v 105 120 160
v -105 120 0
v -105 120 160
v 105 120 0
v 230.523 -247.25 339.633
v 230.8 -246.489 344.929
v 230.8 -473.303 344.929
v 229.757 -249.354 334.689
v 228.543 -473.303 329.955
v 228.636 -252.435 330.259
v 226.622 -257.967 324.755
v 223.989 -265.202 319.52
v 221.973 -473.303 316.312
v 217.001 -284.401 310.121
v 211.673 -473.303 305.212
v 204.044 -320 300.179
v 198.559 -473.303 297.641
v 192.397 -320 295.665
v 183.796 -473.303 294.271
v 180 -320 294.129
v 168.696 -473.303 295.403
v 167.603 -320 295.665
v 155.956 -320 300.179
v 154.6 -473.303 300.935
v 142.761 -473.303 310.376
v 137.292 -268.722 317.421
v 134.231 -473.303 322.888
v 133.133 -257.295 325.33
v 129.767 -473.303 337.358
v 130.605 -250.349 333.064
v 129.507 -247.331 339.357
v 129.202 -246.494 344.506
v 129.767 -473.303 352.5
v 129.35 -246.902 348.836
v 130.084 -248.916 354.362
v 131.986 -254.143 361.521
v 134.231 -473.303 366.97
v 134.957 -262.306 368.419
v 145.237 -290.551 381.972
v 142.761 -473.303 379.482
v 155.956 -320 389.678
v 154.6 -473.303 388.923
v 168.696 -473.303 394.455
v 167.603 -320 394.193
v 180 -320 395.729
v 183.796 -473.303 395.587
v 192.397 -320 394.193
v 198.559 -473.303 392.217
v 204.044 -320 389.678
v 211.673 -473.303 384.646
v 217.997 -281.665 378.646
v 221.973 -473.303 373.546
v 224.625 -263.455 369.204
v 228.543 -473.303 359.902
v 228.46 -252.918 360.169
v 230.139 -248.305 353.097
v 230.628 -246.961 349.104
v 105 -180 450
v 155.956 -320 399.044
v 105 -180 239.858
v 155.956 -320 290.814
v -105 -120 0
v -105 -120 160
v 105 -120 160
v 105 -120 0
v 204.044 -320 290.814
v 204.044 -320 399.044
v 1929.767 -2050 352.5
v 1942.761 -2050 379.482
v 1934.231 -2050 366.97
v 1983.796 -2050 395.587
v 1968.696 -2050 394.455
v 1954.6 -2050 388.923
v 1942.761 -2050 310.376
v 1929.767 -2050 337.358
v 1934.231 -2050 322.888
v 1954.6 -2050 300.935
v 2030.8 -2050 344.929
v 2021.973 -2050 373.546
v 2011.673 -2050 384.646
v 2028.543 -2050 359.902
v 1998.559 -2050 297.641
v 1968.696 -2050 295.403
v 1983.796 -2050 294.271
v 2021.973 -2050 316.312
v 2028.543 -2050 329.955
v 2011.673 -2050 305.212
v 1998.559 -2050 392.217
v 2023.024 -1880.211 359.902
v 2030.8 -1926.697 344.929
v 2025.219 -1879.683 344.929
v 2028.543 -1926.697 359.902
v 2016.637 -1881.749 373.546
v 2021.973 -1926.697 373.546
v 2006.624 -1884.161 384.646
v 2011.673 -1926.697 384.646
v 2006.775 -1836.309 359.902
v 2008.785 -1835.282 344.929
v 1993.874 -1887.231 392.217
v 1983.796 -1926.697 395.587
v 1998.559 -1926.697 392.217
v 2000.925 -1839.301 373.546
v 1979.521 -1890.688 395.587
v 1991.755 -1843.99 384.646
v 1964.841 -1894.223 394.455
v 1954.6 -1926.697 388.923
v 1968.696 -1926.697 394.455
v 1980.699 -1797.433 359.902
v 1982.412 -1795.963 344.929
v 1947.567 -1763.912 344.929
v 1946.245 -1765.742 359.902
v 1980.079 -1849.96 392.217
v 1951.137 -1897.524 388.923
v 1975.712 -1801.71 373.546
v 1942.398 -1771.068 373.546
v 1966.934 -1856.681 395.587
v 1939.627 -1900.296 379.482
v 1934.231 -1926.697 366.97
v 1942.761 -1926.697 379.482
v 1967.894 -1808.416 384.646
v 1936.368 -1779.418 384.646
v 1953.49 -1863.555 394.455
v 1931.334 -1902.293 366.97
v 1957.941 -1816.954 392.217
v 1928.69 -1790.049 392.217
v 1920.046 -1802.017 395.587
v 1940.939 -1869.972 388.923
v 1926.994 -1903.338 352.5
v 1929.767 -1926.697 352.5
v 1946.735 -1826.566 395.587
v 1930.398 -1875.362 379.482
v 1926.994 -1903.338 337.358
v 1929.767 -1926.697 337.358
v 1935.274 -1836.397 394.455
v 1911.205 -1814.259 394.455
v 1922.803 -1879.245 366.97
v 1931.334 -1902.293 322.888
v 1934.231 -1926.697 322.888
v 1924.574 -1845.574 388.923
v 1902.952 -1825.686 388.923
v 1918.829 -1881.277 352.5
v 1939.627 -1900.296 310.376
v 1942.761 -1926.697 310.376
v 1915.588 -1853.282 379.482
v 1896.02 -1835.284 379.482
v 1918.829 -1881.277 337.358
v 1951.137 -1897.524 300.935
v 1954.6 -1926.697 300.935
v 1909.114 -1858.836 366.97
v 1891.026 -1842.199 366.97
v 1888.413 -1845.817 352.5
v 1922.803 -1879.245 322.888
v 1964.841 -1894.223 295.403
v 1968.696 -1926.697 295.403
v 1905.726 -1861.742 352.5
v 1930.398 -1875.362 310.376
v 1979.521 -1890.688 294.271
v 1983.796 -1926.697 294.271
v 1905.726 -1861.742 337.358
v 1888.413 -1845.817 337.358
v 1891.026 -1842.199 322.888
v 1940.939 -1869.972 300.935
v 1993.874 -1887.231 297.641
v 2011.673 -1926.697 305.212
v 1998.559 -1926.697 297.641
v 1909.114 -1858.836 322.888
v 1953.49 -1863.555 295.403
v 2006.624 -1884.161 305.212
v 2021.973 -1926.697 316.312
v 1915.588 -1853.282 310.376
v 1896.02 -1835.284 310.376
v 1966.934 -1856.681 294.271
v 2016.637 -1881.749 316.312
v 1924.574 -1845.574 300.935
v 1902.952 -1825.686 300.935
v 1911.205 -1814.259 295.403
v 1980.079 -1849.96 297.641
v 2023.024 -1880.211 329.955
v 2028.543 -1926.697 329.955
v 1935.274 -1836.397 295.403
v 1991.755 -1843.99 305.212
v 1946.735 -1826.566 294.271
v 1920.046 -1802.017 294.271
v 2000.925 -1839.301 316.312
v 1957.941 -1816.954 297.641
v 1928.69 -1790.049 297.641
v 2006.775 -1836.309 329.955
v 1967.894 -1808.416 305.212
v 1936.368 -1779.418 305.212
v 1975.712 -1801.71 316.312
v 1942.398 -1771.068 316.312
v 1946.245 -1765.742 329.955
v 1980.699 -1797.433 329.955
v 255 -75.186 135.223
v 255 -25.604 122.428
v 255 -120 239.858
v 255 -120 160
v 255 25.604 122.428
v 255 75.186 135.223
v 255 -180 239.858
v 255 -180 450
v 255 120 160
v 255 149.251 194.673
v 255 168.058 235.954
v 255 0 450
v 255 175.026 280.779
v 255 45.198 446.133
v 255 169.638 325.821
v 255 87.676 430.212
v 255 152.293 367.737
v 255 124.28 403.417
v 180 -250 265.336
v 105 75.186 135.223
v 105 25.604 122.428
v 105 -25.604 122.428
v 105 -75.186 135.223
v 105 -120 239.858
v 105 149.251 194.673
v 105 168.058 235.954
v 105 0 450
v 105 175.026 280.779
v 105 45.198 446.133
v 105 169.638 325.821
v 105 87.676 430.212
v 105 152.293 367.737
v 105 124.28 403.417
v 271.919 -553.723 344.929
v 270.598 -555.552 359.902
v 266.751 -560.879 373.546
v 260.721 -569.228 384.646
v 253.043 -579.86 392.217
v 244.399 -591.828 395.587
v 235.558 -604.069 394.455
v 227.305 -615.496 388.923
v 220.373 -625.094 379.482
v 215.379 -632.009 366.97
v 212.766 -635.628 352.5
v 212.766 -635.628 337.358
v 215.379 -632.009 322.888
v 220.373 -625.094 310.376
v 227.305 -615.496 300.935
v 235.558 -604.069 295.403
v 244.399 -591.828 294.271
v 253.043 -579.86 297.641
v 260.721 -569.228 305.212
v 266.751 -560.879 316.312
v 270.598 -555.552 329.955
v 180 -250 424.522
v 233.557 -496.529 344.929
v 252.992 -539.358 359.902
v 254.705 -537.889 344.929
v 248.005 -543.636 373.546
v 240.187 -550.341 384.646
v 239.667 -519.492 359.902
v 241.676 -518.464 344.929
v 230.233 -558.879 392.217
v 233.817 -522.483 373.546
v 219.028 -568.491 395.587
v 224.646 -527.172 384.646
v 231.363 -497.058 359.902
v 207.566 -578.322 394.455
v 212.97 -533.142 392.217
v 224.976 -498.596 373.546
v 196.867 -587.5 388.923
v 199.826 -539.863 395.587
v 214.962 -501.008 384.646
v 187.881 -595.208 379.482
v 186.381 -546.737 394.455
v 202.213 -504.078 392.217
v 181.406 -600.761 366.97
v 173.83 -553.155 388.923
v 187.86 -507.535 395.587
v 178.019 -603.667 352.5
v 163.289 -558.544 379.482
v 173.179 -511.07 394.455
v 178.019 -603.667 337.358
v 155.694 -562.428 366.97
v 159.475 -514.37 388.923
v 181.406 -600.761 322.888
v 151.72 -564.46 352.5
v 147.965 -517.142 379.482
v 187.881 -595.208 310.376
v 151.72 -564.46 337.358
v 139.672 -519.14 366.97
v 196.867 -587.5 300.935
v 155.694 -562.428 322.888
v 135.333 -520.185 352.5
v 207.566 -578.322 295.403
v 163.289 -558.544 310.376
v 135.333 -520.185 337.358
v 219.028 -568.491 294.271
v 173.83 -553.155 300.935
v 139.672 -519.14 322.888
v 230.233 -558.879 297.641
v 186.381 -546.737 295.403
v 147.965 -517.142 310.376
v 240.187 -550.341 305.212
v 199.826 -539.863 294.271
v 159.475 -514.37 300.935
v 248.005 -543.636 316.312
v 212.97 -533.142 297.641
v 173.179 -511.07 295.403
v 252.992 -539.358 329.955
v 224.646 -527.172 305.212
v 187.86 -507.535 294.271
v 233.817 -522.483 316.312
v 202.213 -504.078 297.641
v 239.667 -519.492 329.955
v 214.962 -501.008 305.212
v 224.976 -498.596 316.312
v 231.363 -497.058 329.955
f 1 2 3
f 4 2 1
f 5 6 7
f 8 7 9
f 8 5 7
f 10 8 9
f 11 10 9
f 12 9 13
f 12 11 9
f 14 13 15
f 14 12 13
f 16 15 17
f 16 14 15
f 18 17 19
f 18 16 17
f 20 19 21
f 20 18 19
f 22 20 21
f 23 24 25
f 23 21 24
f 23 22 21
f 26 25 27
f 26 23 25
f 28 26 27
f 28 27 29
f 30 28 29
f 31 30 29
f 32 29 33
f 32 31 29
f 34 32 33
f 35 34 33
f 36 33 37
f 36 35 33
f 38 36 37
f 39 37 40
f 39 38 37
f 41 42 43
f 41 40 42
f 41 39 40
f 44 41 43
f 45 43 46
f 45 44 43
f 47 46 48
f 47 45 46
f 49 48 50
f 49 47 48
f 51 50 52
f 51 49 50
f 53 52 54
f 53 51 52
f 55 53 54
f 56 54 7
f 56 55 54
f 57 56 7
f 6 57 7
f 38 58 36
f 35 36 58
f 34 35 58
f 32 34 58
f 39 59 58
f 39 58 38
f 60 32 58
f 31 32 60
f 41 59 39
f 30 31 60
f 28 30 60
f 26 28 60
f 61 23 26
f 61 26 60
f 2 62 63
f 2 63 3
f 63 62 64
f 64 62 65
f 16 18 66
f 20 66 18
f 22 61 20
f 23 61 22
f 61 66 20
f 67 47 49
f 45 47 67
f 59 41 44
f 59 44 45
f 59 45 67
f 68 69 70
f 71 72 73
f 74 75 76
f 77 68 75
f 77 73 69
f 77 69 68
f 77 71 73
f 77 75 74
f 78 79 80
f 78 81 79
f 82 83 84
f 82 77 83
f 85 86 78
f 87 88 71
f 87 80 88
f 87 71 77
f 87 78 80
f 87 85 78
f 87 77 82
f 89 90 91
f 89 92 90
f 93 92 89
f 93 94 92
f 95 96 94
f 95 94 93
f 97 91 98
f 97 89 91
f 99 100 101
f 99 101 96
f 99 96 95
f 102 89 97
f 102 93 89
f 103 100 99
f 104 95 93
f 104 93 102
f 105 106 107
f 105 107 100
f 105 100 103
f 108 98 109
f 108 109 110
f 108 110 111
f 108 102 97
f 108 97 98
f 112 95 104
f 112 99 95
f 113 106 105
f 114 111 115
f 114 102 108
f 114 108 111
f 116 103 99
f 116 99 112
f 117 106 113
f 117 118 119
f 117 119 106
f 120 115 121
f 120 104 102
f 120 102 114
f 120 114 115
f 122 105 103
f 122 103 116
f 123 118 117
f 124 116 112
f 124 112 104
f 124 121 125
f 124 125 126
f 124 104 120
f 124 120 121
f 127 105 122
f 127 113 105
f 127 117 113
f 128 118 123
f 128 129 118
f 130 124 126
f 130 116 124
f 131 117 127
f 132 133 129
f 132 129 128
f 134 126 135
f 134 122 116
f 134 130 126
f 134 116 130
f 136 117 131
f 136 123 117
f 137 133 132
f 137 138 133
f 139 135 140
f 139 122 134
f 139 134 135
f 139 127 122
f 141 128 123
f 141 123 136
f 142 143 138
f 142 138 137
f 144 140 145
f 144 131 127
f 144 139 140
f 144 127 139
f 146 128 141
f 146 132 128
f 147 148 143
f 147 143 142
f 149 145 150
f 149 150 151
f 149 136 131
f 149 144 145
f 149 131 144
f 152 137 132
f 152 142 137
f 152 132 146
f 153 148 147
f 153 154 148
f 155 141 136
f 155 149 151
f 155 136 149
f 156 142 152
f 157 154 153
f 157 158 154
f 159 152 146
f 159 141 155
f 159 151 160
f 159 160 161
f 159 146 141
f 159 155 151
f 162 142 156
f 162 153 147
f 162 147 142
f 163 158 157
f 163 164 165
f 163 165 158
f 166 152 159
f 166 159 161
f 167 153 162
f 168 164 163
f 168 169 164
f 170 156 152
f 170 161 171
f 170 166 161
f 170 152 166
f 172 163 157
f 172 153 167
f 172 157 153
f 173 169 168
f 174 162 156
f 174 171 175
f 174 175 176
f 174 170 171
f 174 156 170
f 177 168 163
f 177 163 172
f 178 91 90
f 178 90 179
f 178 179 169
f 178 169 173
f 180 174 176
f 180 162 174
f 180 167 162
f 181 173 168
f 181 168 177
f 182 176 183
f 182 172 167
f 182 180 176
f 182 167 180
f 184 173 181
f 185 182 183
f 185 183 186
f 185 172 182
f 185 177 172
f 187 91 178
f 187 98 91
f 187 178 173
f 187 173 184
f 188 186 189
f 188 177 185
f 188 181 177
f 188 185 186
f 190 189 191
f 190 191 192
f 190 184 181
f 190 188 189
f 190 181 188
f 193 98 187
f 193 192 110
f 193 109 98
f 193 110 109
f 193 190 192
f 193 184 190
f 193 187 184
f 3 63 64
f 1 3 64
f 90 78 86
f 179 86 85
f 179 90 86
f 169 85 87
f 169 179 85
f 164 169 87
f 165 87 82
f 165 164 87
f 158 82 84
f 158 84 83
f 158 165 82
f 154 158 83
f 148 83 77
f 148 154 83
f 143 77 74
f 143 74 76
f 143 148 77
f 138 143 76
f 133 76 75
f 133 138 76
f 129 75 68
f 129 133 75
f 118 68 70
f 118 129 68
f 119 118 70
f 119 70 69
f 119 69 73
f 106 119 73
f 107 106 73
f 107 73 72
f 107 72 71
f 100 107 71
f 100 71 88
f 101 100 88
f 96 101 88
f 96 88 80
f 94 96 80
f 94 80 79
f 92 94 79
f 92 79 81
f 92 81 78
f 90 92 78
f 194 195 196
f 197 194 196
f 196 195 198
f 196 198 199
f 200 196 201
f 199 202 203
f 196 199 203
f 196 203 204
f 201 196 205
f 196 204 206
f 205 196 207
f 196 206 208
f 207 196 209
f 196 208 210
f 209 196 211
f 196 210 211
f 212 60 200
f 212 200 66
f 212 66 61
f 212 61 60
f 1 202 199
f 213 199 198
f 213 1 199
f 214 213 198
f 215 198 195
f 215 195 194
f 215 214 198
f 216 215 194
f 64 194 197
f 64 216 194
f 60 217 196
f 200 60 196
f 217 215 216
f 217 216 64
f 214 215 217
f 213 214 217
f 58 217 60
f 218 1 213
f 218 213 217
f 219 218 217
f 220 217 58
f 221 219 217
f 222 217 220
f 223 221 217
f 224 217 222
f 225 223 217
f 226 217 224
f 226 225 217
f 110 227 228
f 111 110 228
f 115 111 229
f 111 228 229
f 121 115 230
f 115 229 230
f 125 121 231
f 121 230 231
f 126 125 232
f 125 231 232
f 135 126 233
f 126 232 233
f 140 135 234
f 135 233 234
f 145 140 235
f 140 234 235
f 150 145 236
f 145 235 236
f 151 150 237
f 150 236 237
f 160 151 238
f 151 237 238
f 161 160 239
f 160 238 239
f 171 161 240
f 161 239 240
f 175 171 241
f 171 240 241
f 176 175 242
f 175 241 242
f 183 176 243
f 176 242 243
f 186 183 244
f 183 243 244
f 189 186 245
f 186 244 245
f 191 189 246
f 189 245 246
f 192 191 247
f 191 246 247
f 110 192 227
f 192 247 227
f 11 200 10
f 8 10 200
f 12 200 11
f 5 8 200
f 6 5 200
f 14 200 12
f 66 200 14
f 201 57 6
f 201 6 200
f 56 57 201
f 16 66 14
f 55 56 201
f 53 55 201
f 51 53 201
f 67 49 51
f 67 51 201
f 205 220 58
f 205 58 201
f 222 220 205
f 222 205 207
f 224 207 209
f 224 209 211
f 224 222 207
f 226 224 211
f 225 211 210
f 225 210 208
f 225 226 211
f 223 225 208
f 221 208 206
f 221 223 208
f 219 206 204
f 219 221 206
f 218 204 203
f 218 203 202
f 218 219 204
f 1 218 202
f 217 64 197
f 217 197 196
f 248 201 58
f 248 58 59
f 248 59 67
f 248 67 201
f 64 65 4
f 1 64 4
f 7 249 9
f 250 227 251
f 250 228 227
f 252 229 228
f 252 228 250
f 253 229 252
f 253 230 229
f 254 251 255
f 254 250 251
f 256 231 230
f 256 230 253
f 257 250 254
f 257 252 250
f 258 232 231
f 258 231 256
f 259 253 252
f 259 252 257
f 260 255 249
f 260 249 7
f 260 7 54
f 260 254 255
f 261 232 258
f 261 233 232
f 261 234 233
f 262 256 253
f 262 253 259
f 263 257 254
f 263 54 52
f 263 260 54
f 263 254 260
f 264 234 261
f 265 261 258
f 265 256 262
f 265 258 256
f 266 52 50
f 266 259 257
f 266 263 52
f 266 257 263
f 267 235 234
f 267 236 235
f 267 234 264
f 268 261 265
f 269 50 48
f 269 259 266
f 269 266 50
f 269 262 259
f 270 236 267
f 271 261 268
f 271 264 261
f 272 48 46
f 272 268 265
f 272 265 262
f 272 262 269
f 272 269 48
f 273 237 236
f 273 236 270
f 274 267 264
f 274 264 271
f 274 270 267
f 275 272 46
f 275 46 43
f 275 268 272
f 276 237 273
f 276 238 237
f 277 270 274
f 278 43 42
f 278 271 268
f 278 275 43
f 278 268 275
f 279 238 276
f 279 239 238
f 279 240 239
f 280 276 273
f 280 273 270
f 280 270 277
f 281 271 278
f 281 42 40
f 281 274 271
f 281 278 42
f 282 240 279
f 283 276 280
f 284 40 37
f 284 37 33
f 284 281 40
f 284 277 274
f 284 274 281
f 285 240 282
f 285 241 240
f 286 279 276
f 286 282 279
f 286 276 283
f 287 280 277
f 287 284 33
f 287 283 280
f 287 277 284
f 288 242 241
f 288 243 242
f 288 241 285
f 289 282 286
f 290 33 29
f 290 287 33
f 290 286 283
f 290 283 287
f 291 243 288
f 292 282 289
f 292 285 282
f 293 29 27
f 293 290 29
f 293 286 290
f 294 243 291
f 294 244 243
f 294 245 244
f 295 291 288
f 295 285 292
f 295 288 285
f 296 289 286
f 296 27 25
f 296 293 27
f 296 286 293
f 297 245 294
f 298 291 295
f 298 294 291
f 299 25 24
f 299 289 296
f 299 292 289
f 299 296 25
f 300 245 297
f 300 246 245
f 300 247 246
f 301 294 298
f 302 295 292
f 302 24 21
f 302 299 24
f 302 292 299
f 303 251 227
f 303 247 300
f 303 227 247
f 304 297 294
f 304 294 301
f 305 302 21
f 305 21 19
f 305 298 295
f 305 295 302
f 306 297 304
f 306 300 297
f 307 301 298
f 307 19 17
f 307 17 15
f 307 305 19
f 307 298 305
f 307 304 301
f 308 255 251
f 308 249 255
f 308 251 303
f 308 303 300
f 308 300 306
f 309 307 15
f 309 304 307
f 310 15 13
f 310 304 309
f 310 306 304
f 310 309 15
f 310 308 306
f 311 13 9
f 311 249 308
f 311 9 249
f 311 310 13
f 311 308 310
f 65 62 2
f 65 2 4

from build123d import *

# Parameters (mm, degrees)
CROQUIS1_W              = 210
CROQUIS1_H              = 240
SALIENTE_EXTRUIR1_DEPTH = 160
SALIENTE_EXTRUIR2_DEPTH = 150
CROQUIS3_W              = 150
CROQUIS3_H              = 210.142141412
SALIENTE_EXTRUIR3_DEPTH = 60
CROQUIS4_R              = 50.8
SALIENTE_EXTRUIR4_DEPTH = 170
CROQUIS5_W              = 150
CROQUIS5_H              = 210.142141412
SALIENTE_EXTRUIR5_DEPTH = 140
SALIENTE_EXTRUIR5_TAPER = 20
CROQUIS7_R              = 50.8


with BuildPart() as part:
    # Croquis1 → Saliente-Extruir1 (new body)
    with BuildSketch(Plane.XY):
        Rectangle(CROQUIS1_W, CROQUIS1_H)
    extrude(amount=SALIENTE_EXTRUIR1_DEPTH)


with BuildPart() as body_2:
    # Croquis2 → Saliente-Extruir2 (new body)
    with BuildSketch(Plane(origin=(105, 0, 0), x_dir=(0, 0, -1), z_dir=(1, 0, 0))):
        with BuildLine():
            Line((-160, -120), (-450, -120))
            Line((-450, -120), (-450, 0))
            ThreePointArc((-450, 0), (-347.372372038, 162.399899092), (-160, 120))
            ThreePointArc((-160, 120), (-120.80959106, 0), (-160, -120))
        make_face()
    extrude(amount=SALIENTE_EXTRUIR2_DEPTH)

    # Croquis3 → Saliente-Extruir3 (add)
    with BuildSketch(Plane.XZ.offset(120)):
        with Locations((180, 344.928929294)):
            Rectangle(CROQUIS3_W, CROQUIS3_H)
    extrude(amount=SALIENTE_EXTRUIR3_DEPTH)

    # Croquis4 → Saliente-Extruir4 (add)
    with BuildSketch(Plane.XZ.offset(180)):
        with Locations((180, 344.928929294)):
            Circle(CROQUIS4_R)
    extrude(amount=SALIENTE_EXTRUIR4_DEPTH)

    # Croquis5 → Saliente-Extruir5 (add)
    with BuildSketch(Plane.XZ.offset(180)):
        with Locations((180, 344.928929294)):
            Rectangle(CROQUIS5_W, CROQUIS5_H)
    extrude(amount=SALIENTE_EXTRUIR5_DEPTH, taper=SALIENTE_EXTRUIR5_TAPER)

    # Barrer1: sweep along a curve in space
    with BuildLine() as barrer1_path:
        Line((1980, -2050, 344.928929294), (1980, -1926.69669426, 344.928929294))
        ThreePointArc((1980, -1926.69669426, 344.928929294), (1963.554366199, -1858.408838317, 344.928929294), (1917.823583077, -1805.09481, 344.928929294))
        Line((1917.823583077, -1805.09481, 344.928929294), (242.176416923, -594.90519, 344.928929294))
        ThreePointArc((242.176416923, -594.90519, 344.928929294), (196.445633801, -541.591161683, 344.928929294), (180, -473.30330574, 344.928929294))
        Line((180, -473.30330574, 344.928929294), (180, -350, 344.928929294))
    # Croquis7 → Barrer1 (sweep)
    with BuildSketch(Plane.XZ.offset(350)):
        with Locations((180, 344.928929294)):
            Circle(CROQUIS7_R)
    sweep(path=barrer1_path.line)


solid = Compound([part.part, body_2.part])
